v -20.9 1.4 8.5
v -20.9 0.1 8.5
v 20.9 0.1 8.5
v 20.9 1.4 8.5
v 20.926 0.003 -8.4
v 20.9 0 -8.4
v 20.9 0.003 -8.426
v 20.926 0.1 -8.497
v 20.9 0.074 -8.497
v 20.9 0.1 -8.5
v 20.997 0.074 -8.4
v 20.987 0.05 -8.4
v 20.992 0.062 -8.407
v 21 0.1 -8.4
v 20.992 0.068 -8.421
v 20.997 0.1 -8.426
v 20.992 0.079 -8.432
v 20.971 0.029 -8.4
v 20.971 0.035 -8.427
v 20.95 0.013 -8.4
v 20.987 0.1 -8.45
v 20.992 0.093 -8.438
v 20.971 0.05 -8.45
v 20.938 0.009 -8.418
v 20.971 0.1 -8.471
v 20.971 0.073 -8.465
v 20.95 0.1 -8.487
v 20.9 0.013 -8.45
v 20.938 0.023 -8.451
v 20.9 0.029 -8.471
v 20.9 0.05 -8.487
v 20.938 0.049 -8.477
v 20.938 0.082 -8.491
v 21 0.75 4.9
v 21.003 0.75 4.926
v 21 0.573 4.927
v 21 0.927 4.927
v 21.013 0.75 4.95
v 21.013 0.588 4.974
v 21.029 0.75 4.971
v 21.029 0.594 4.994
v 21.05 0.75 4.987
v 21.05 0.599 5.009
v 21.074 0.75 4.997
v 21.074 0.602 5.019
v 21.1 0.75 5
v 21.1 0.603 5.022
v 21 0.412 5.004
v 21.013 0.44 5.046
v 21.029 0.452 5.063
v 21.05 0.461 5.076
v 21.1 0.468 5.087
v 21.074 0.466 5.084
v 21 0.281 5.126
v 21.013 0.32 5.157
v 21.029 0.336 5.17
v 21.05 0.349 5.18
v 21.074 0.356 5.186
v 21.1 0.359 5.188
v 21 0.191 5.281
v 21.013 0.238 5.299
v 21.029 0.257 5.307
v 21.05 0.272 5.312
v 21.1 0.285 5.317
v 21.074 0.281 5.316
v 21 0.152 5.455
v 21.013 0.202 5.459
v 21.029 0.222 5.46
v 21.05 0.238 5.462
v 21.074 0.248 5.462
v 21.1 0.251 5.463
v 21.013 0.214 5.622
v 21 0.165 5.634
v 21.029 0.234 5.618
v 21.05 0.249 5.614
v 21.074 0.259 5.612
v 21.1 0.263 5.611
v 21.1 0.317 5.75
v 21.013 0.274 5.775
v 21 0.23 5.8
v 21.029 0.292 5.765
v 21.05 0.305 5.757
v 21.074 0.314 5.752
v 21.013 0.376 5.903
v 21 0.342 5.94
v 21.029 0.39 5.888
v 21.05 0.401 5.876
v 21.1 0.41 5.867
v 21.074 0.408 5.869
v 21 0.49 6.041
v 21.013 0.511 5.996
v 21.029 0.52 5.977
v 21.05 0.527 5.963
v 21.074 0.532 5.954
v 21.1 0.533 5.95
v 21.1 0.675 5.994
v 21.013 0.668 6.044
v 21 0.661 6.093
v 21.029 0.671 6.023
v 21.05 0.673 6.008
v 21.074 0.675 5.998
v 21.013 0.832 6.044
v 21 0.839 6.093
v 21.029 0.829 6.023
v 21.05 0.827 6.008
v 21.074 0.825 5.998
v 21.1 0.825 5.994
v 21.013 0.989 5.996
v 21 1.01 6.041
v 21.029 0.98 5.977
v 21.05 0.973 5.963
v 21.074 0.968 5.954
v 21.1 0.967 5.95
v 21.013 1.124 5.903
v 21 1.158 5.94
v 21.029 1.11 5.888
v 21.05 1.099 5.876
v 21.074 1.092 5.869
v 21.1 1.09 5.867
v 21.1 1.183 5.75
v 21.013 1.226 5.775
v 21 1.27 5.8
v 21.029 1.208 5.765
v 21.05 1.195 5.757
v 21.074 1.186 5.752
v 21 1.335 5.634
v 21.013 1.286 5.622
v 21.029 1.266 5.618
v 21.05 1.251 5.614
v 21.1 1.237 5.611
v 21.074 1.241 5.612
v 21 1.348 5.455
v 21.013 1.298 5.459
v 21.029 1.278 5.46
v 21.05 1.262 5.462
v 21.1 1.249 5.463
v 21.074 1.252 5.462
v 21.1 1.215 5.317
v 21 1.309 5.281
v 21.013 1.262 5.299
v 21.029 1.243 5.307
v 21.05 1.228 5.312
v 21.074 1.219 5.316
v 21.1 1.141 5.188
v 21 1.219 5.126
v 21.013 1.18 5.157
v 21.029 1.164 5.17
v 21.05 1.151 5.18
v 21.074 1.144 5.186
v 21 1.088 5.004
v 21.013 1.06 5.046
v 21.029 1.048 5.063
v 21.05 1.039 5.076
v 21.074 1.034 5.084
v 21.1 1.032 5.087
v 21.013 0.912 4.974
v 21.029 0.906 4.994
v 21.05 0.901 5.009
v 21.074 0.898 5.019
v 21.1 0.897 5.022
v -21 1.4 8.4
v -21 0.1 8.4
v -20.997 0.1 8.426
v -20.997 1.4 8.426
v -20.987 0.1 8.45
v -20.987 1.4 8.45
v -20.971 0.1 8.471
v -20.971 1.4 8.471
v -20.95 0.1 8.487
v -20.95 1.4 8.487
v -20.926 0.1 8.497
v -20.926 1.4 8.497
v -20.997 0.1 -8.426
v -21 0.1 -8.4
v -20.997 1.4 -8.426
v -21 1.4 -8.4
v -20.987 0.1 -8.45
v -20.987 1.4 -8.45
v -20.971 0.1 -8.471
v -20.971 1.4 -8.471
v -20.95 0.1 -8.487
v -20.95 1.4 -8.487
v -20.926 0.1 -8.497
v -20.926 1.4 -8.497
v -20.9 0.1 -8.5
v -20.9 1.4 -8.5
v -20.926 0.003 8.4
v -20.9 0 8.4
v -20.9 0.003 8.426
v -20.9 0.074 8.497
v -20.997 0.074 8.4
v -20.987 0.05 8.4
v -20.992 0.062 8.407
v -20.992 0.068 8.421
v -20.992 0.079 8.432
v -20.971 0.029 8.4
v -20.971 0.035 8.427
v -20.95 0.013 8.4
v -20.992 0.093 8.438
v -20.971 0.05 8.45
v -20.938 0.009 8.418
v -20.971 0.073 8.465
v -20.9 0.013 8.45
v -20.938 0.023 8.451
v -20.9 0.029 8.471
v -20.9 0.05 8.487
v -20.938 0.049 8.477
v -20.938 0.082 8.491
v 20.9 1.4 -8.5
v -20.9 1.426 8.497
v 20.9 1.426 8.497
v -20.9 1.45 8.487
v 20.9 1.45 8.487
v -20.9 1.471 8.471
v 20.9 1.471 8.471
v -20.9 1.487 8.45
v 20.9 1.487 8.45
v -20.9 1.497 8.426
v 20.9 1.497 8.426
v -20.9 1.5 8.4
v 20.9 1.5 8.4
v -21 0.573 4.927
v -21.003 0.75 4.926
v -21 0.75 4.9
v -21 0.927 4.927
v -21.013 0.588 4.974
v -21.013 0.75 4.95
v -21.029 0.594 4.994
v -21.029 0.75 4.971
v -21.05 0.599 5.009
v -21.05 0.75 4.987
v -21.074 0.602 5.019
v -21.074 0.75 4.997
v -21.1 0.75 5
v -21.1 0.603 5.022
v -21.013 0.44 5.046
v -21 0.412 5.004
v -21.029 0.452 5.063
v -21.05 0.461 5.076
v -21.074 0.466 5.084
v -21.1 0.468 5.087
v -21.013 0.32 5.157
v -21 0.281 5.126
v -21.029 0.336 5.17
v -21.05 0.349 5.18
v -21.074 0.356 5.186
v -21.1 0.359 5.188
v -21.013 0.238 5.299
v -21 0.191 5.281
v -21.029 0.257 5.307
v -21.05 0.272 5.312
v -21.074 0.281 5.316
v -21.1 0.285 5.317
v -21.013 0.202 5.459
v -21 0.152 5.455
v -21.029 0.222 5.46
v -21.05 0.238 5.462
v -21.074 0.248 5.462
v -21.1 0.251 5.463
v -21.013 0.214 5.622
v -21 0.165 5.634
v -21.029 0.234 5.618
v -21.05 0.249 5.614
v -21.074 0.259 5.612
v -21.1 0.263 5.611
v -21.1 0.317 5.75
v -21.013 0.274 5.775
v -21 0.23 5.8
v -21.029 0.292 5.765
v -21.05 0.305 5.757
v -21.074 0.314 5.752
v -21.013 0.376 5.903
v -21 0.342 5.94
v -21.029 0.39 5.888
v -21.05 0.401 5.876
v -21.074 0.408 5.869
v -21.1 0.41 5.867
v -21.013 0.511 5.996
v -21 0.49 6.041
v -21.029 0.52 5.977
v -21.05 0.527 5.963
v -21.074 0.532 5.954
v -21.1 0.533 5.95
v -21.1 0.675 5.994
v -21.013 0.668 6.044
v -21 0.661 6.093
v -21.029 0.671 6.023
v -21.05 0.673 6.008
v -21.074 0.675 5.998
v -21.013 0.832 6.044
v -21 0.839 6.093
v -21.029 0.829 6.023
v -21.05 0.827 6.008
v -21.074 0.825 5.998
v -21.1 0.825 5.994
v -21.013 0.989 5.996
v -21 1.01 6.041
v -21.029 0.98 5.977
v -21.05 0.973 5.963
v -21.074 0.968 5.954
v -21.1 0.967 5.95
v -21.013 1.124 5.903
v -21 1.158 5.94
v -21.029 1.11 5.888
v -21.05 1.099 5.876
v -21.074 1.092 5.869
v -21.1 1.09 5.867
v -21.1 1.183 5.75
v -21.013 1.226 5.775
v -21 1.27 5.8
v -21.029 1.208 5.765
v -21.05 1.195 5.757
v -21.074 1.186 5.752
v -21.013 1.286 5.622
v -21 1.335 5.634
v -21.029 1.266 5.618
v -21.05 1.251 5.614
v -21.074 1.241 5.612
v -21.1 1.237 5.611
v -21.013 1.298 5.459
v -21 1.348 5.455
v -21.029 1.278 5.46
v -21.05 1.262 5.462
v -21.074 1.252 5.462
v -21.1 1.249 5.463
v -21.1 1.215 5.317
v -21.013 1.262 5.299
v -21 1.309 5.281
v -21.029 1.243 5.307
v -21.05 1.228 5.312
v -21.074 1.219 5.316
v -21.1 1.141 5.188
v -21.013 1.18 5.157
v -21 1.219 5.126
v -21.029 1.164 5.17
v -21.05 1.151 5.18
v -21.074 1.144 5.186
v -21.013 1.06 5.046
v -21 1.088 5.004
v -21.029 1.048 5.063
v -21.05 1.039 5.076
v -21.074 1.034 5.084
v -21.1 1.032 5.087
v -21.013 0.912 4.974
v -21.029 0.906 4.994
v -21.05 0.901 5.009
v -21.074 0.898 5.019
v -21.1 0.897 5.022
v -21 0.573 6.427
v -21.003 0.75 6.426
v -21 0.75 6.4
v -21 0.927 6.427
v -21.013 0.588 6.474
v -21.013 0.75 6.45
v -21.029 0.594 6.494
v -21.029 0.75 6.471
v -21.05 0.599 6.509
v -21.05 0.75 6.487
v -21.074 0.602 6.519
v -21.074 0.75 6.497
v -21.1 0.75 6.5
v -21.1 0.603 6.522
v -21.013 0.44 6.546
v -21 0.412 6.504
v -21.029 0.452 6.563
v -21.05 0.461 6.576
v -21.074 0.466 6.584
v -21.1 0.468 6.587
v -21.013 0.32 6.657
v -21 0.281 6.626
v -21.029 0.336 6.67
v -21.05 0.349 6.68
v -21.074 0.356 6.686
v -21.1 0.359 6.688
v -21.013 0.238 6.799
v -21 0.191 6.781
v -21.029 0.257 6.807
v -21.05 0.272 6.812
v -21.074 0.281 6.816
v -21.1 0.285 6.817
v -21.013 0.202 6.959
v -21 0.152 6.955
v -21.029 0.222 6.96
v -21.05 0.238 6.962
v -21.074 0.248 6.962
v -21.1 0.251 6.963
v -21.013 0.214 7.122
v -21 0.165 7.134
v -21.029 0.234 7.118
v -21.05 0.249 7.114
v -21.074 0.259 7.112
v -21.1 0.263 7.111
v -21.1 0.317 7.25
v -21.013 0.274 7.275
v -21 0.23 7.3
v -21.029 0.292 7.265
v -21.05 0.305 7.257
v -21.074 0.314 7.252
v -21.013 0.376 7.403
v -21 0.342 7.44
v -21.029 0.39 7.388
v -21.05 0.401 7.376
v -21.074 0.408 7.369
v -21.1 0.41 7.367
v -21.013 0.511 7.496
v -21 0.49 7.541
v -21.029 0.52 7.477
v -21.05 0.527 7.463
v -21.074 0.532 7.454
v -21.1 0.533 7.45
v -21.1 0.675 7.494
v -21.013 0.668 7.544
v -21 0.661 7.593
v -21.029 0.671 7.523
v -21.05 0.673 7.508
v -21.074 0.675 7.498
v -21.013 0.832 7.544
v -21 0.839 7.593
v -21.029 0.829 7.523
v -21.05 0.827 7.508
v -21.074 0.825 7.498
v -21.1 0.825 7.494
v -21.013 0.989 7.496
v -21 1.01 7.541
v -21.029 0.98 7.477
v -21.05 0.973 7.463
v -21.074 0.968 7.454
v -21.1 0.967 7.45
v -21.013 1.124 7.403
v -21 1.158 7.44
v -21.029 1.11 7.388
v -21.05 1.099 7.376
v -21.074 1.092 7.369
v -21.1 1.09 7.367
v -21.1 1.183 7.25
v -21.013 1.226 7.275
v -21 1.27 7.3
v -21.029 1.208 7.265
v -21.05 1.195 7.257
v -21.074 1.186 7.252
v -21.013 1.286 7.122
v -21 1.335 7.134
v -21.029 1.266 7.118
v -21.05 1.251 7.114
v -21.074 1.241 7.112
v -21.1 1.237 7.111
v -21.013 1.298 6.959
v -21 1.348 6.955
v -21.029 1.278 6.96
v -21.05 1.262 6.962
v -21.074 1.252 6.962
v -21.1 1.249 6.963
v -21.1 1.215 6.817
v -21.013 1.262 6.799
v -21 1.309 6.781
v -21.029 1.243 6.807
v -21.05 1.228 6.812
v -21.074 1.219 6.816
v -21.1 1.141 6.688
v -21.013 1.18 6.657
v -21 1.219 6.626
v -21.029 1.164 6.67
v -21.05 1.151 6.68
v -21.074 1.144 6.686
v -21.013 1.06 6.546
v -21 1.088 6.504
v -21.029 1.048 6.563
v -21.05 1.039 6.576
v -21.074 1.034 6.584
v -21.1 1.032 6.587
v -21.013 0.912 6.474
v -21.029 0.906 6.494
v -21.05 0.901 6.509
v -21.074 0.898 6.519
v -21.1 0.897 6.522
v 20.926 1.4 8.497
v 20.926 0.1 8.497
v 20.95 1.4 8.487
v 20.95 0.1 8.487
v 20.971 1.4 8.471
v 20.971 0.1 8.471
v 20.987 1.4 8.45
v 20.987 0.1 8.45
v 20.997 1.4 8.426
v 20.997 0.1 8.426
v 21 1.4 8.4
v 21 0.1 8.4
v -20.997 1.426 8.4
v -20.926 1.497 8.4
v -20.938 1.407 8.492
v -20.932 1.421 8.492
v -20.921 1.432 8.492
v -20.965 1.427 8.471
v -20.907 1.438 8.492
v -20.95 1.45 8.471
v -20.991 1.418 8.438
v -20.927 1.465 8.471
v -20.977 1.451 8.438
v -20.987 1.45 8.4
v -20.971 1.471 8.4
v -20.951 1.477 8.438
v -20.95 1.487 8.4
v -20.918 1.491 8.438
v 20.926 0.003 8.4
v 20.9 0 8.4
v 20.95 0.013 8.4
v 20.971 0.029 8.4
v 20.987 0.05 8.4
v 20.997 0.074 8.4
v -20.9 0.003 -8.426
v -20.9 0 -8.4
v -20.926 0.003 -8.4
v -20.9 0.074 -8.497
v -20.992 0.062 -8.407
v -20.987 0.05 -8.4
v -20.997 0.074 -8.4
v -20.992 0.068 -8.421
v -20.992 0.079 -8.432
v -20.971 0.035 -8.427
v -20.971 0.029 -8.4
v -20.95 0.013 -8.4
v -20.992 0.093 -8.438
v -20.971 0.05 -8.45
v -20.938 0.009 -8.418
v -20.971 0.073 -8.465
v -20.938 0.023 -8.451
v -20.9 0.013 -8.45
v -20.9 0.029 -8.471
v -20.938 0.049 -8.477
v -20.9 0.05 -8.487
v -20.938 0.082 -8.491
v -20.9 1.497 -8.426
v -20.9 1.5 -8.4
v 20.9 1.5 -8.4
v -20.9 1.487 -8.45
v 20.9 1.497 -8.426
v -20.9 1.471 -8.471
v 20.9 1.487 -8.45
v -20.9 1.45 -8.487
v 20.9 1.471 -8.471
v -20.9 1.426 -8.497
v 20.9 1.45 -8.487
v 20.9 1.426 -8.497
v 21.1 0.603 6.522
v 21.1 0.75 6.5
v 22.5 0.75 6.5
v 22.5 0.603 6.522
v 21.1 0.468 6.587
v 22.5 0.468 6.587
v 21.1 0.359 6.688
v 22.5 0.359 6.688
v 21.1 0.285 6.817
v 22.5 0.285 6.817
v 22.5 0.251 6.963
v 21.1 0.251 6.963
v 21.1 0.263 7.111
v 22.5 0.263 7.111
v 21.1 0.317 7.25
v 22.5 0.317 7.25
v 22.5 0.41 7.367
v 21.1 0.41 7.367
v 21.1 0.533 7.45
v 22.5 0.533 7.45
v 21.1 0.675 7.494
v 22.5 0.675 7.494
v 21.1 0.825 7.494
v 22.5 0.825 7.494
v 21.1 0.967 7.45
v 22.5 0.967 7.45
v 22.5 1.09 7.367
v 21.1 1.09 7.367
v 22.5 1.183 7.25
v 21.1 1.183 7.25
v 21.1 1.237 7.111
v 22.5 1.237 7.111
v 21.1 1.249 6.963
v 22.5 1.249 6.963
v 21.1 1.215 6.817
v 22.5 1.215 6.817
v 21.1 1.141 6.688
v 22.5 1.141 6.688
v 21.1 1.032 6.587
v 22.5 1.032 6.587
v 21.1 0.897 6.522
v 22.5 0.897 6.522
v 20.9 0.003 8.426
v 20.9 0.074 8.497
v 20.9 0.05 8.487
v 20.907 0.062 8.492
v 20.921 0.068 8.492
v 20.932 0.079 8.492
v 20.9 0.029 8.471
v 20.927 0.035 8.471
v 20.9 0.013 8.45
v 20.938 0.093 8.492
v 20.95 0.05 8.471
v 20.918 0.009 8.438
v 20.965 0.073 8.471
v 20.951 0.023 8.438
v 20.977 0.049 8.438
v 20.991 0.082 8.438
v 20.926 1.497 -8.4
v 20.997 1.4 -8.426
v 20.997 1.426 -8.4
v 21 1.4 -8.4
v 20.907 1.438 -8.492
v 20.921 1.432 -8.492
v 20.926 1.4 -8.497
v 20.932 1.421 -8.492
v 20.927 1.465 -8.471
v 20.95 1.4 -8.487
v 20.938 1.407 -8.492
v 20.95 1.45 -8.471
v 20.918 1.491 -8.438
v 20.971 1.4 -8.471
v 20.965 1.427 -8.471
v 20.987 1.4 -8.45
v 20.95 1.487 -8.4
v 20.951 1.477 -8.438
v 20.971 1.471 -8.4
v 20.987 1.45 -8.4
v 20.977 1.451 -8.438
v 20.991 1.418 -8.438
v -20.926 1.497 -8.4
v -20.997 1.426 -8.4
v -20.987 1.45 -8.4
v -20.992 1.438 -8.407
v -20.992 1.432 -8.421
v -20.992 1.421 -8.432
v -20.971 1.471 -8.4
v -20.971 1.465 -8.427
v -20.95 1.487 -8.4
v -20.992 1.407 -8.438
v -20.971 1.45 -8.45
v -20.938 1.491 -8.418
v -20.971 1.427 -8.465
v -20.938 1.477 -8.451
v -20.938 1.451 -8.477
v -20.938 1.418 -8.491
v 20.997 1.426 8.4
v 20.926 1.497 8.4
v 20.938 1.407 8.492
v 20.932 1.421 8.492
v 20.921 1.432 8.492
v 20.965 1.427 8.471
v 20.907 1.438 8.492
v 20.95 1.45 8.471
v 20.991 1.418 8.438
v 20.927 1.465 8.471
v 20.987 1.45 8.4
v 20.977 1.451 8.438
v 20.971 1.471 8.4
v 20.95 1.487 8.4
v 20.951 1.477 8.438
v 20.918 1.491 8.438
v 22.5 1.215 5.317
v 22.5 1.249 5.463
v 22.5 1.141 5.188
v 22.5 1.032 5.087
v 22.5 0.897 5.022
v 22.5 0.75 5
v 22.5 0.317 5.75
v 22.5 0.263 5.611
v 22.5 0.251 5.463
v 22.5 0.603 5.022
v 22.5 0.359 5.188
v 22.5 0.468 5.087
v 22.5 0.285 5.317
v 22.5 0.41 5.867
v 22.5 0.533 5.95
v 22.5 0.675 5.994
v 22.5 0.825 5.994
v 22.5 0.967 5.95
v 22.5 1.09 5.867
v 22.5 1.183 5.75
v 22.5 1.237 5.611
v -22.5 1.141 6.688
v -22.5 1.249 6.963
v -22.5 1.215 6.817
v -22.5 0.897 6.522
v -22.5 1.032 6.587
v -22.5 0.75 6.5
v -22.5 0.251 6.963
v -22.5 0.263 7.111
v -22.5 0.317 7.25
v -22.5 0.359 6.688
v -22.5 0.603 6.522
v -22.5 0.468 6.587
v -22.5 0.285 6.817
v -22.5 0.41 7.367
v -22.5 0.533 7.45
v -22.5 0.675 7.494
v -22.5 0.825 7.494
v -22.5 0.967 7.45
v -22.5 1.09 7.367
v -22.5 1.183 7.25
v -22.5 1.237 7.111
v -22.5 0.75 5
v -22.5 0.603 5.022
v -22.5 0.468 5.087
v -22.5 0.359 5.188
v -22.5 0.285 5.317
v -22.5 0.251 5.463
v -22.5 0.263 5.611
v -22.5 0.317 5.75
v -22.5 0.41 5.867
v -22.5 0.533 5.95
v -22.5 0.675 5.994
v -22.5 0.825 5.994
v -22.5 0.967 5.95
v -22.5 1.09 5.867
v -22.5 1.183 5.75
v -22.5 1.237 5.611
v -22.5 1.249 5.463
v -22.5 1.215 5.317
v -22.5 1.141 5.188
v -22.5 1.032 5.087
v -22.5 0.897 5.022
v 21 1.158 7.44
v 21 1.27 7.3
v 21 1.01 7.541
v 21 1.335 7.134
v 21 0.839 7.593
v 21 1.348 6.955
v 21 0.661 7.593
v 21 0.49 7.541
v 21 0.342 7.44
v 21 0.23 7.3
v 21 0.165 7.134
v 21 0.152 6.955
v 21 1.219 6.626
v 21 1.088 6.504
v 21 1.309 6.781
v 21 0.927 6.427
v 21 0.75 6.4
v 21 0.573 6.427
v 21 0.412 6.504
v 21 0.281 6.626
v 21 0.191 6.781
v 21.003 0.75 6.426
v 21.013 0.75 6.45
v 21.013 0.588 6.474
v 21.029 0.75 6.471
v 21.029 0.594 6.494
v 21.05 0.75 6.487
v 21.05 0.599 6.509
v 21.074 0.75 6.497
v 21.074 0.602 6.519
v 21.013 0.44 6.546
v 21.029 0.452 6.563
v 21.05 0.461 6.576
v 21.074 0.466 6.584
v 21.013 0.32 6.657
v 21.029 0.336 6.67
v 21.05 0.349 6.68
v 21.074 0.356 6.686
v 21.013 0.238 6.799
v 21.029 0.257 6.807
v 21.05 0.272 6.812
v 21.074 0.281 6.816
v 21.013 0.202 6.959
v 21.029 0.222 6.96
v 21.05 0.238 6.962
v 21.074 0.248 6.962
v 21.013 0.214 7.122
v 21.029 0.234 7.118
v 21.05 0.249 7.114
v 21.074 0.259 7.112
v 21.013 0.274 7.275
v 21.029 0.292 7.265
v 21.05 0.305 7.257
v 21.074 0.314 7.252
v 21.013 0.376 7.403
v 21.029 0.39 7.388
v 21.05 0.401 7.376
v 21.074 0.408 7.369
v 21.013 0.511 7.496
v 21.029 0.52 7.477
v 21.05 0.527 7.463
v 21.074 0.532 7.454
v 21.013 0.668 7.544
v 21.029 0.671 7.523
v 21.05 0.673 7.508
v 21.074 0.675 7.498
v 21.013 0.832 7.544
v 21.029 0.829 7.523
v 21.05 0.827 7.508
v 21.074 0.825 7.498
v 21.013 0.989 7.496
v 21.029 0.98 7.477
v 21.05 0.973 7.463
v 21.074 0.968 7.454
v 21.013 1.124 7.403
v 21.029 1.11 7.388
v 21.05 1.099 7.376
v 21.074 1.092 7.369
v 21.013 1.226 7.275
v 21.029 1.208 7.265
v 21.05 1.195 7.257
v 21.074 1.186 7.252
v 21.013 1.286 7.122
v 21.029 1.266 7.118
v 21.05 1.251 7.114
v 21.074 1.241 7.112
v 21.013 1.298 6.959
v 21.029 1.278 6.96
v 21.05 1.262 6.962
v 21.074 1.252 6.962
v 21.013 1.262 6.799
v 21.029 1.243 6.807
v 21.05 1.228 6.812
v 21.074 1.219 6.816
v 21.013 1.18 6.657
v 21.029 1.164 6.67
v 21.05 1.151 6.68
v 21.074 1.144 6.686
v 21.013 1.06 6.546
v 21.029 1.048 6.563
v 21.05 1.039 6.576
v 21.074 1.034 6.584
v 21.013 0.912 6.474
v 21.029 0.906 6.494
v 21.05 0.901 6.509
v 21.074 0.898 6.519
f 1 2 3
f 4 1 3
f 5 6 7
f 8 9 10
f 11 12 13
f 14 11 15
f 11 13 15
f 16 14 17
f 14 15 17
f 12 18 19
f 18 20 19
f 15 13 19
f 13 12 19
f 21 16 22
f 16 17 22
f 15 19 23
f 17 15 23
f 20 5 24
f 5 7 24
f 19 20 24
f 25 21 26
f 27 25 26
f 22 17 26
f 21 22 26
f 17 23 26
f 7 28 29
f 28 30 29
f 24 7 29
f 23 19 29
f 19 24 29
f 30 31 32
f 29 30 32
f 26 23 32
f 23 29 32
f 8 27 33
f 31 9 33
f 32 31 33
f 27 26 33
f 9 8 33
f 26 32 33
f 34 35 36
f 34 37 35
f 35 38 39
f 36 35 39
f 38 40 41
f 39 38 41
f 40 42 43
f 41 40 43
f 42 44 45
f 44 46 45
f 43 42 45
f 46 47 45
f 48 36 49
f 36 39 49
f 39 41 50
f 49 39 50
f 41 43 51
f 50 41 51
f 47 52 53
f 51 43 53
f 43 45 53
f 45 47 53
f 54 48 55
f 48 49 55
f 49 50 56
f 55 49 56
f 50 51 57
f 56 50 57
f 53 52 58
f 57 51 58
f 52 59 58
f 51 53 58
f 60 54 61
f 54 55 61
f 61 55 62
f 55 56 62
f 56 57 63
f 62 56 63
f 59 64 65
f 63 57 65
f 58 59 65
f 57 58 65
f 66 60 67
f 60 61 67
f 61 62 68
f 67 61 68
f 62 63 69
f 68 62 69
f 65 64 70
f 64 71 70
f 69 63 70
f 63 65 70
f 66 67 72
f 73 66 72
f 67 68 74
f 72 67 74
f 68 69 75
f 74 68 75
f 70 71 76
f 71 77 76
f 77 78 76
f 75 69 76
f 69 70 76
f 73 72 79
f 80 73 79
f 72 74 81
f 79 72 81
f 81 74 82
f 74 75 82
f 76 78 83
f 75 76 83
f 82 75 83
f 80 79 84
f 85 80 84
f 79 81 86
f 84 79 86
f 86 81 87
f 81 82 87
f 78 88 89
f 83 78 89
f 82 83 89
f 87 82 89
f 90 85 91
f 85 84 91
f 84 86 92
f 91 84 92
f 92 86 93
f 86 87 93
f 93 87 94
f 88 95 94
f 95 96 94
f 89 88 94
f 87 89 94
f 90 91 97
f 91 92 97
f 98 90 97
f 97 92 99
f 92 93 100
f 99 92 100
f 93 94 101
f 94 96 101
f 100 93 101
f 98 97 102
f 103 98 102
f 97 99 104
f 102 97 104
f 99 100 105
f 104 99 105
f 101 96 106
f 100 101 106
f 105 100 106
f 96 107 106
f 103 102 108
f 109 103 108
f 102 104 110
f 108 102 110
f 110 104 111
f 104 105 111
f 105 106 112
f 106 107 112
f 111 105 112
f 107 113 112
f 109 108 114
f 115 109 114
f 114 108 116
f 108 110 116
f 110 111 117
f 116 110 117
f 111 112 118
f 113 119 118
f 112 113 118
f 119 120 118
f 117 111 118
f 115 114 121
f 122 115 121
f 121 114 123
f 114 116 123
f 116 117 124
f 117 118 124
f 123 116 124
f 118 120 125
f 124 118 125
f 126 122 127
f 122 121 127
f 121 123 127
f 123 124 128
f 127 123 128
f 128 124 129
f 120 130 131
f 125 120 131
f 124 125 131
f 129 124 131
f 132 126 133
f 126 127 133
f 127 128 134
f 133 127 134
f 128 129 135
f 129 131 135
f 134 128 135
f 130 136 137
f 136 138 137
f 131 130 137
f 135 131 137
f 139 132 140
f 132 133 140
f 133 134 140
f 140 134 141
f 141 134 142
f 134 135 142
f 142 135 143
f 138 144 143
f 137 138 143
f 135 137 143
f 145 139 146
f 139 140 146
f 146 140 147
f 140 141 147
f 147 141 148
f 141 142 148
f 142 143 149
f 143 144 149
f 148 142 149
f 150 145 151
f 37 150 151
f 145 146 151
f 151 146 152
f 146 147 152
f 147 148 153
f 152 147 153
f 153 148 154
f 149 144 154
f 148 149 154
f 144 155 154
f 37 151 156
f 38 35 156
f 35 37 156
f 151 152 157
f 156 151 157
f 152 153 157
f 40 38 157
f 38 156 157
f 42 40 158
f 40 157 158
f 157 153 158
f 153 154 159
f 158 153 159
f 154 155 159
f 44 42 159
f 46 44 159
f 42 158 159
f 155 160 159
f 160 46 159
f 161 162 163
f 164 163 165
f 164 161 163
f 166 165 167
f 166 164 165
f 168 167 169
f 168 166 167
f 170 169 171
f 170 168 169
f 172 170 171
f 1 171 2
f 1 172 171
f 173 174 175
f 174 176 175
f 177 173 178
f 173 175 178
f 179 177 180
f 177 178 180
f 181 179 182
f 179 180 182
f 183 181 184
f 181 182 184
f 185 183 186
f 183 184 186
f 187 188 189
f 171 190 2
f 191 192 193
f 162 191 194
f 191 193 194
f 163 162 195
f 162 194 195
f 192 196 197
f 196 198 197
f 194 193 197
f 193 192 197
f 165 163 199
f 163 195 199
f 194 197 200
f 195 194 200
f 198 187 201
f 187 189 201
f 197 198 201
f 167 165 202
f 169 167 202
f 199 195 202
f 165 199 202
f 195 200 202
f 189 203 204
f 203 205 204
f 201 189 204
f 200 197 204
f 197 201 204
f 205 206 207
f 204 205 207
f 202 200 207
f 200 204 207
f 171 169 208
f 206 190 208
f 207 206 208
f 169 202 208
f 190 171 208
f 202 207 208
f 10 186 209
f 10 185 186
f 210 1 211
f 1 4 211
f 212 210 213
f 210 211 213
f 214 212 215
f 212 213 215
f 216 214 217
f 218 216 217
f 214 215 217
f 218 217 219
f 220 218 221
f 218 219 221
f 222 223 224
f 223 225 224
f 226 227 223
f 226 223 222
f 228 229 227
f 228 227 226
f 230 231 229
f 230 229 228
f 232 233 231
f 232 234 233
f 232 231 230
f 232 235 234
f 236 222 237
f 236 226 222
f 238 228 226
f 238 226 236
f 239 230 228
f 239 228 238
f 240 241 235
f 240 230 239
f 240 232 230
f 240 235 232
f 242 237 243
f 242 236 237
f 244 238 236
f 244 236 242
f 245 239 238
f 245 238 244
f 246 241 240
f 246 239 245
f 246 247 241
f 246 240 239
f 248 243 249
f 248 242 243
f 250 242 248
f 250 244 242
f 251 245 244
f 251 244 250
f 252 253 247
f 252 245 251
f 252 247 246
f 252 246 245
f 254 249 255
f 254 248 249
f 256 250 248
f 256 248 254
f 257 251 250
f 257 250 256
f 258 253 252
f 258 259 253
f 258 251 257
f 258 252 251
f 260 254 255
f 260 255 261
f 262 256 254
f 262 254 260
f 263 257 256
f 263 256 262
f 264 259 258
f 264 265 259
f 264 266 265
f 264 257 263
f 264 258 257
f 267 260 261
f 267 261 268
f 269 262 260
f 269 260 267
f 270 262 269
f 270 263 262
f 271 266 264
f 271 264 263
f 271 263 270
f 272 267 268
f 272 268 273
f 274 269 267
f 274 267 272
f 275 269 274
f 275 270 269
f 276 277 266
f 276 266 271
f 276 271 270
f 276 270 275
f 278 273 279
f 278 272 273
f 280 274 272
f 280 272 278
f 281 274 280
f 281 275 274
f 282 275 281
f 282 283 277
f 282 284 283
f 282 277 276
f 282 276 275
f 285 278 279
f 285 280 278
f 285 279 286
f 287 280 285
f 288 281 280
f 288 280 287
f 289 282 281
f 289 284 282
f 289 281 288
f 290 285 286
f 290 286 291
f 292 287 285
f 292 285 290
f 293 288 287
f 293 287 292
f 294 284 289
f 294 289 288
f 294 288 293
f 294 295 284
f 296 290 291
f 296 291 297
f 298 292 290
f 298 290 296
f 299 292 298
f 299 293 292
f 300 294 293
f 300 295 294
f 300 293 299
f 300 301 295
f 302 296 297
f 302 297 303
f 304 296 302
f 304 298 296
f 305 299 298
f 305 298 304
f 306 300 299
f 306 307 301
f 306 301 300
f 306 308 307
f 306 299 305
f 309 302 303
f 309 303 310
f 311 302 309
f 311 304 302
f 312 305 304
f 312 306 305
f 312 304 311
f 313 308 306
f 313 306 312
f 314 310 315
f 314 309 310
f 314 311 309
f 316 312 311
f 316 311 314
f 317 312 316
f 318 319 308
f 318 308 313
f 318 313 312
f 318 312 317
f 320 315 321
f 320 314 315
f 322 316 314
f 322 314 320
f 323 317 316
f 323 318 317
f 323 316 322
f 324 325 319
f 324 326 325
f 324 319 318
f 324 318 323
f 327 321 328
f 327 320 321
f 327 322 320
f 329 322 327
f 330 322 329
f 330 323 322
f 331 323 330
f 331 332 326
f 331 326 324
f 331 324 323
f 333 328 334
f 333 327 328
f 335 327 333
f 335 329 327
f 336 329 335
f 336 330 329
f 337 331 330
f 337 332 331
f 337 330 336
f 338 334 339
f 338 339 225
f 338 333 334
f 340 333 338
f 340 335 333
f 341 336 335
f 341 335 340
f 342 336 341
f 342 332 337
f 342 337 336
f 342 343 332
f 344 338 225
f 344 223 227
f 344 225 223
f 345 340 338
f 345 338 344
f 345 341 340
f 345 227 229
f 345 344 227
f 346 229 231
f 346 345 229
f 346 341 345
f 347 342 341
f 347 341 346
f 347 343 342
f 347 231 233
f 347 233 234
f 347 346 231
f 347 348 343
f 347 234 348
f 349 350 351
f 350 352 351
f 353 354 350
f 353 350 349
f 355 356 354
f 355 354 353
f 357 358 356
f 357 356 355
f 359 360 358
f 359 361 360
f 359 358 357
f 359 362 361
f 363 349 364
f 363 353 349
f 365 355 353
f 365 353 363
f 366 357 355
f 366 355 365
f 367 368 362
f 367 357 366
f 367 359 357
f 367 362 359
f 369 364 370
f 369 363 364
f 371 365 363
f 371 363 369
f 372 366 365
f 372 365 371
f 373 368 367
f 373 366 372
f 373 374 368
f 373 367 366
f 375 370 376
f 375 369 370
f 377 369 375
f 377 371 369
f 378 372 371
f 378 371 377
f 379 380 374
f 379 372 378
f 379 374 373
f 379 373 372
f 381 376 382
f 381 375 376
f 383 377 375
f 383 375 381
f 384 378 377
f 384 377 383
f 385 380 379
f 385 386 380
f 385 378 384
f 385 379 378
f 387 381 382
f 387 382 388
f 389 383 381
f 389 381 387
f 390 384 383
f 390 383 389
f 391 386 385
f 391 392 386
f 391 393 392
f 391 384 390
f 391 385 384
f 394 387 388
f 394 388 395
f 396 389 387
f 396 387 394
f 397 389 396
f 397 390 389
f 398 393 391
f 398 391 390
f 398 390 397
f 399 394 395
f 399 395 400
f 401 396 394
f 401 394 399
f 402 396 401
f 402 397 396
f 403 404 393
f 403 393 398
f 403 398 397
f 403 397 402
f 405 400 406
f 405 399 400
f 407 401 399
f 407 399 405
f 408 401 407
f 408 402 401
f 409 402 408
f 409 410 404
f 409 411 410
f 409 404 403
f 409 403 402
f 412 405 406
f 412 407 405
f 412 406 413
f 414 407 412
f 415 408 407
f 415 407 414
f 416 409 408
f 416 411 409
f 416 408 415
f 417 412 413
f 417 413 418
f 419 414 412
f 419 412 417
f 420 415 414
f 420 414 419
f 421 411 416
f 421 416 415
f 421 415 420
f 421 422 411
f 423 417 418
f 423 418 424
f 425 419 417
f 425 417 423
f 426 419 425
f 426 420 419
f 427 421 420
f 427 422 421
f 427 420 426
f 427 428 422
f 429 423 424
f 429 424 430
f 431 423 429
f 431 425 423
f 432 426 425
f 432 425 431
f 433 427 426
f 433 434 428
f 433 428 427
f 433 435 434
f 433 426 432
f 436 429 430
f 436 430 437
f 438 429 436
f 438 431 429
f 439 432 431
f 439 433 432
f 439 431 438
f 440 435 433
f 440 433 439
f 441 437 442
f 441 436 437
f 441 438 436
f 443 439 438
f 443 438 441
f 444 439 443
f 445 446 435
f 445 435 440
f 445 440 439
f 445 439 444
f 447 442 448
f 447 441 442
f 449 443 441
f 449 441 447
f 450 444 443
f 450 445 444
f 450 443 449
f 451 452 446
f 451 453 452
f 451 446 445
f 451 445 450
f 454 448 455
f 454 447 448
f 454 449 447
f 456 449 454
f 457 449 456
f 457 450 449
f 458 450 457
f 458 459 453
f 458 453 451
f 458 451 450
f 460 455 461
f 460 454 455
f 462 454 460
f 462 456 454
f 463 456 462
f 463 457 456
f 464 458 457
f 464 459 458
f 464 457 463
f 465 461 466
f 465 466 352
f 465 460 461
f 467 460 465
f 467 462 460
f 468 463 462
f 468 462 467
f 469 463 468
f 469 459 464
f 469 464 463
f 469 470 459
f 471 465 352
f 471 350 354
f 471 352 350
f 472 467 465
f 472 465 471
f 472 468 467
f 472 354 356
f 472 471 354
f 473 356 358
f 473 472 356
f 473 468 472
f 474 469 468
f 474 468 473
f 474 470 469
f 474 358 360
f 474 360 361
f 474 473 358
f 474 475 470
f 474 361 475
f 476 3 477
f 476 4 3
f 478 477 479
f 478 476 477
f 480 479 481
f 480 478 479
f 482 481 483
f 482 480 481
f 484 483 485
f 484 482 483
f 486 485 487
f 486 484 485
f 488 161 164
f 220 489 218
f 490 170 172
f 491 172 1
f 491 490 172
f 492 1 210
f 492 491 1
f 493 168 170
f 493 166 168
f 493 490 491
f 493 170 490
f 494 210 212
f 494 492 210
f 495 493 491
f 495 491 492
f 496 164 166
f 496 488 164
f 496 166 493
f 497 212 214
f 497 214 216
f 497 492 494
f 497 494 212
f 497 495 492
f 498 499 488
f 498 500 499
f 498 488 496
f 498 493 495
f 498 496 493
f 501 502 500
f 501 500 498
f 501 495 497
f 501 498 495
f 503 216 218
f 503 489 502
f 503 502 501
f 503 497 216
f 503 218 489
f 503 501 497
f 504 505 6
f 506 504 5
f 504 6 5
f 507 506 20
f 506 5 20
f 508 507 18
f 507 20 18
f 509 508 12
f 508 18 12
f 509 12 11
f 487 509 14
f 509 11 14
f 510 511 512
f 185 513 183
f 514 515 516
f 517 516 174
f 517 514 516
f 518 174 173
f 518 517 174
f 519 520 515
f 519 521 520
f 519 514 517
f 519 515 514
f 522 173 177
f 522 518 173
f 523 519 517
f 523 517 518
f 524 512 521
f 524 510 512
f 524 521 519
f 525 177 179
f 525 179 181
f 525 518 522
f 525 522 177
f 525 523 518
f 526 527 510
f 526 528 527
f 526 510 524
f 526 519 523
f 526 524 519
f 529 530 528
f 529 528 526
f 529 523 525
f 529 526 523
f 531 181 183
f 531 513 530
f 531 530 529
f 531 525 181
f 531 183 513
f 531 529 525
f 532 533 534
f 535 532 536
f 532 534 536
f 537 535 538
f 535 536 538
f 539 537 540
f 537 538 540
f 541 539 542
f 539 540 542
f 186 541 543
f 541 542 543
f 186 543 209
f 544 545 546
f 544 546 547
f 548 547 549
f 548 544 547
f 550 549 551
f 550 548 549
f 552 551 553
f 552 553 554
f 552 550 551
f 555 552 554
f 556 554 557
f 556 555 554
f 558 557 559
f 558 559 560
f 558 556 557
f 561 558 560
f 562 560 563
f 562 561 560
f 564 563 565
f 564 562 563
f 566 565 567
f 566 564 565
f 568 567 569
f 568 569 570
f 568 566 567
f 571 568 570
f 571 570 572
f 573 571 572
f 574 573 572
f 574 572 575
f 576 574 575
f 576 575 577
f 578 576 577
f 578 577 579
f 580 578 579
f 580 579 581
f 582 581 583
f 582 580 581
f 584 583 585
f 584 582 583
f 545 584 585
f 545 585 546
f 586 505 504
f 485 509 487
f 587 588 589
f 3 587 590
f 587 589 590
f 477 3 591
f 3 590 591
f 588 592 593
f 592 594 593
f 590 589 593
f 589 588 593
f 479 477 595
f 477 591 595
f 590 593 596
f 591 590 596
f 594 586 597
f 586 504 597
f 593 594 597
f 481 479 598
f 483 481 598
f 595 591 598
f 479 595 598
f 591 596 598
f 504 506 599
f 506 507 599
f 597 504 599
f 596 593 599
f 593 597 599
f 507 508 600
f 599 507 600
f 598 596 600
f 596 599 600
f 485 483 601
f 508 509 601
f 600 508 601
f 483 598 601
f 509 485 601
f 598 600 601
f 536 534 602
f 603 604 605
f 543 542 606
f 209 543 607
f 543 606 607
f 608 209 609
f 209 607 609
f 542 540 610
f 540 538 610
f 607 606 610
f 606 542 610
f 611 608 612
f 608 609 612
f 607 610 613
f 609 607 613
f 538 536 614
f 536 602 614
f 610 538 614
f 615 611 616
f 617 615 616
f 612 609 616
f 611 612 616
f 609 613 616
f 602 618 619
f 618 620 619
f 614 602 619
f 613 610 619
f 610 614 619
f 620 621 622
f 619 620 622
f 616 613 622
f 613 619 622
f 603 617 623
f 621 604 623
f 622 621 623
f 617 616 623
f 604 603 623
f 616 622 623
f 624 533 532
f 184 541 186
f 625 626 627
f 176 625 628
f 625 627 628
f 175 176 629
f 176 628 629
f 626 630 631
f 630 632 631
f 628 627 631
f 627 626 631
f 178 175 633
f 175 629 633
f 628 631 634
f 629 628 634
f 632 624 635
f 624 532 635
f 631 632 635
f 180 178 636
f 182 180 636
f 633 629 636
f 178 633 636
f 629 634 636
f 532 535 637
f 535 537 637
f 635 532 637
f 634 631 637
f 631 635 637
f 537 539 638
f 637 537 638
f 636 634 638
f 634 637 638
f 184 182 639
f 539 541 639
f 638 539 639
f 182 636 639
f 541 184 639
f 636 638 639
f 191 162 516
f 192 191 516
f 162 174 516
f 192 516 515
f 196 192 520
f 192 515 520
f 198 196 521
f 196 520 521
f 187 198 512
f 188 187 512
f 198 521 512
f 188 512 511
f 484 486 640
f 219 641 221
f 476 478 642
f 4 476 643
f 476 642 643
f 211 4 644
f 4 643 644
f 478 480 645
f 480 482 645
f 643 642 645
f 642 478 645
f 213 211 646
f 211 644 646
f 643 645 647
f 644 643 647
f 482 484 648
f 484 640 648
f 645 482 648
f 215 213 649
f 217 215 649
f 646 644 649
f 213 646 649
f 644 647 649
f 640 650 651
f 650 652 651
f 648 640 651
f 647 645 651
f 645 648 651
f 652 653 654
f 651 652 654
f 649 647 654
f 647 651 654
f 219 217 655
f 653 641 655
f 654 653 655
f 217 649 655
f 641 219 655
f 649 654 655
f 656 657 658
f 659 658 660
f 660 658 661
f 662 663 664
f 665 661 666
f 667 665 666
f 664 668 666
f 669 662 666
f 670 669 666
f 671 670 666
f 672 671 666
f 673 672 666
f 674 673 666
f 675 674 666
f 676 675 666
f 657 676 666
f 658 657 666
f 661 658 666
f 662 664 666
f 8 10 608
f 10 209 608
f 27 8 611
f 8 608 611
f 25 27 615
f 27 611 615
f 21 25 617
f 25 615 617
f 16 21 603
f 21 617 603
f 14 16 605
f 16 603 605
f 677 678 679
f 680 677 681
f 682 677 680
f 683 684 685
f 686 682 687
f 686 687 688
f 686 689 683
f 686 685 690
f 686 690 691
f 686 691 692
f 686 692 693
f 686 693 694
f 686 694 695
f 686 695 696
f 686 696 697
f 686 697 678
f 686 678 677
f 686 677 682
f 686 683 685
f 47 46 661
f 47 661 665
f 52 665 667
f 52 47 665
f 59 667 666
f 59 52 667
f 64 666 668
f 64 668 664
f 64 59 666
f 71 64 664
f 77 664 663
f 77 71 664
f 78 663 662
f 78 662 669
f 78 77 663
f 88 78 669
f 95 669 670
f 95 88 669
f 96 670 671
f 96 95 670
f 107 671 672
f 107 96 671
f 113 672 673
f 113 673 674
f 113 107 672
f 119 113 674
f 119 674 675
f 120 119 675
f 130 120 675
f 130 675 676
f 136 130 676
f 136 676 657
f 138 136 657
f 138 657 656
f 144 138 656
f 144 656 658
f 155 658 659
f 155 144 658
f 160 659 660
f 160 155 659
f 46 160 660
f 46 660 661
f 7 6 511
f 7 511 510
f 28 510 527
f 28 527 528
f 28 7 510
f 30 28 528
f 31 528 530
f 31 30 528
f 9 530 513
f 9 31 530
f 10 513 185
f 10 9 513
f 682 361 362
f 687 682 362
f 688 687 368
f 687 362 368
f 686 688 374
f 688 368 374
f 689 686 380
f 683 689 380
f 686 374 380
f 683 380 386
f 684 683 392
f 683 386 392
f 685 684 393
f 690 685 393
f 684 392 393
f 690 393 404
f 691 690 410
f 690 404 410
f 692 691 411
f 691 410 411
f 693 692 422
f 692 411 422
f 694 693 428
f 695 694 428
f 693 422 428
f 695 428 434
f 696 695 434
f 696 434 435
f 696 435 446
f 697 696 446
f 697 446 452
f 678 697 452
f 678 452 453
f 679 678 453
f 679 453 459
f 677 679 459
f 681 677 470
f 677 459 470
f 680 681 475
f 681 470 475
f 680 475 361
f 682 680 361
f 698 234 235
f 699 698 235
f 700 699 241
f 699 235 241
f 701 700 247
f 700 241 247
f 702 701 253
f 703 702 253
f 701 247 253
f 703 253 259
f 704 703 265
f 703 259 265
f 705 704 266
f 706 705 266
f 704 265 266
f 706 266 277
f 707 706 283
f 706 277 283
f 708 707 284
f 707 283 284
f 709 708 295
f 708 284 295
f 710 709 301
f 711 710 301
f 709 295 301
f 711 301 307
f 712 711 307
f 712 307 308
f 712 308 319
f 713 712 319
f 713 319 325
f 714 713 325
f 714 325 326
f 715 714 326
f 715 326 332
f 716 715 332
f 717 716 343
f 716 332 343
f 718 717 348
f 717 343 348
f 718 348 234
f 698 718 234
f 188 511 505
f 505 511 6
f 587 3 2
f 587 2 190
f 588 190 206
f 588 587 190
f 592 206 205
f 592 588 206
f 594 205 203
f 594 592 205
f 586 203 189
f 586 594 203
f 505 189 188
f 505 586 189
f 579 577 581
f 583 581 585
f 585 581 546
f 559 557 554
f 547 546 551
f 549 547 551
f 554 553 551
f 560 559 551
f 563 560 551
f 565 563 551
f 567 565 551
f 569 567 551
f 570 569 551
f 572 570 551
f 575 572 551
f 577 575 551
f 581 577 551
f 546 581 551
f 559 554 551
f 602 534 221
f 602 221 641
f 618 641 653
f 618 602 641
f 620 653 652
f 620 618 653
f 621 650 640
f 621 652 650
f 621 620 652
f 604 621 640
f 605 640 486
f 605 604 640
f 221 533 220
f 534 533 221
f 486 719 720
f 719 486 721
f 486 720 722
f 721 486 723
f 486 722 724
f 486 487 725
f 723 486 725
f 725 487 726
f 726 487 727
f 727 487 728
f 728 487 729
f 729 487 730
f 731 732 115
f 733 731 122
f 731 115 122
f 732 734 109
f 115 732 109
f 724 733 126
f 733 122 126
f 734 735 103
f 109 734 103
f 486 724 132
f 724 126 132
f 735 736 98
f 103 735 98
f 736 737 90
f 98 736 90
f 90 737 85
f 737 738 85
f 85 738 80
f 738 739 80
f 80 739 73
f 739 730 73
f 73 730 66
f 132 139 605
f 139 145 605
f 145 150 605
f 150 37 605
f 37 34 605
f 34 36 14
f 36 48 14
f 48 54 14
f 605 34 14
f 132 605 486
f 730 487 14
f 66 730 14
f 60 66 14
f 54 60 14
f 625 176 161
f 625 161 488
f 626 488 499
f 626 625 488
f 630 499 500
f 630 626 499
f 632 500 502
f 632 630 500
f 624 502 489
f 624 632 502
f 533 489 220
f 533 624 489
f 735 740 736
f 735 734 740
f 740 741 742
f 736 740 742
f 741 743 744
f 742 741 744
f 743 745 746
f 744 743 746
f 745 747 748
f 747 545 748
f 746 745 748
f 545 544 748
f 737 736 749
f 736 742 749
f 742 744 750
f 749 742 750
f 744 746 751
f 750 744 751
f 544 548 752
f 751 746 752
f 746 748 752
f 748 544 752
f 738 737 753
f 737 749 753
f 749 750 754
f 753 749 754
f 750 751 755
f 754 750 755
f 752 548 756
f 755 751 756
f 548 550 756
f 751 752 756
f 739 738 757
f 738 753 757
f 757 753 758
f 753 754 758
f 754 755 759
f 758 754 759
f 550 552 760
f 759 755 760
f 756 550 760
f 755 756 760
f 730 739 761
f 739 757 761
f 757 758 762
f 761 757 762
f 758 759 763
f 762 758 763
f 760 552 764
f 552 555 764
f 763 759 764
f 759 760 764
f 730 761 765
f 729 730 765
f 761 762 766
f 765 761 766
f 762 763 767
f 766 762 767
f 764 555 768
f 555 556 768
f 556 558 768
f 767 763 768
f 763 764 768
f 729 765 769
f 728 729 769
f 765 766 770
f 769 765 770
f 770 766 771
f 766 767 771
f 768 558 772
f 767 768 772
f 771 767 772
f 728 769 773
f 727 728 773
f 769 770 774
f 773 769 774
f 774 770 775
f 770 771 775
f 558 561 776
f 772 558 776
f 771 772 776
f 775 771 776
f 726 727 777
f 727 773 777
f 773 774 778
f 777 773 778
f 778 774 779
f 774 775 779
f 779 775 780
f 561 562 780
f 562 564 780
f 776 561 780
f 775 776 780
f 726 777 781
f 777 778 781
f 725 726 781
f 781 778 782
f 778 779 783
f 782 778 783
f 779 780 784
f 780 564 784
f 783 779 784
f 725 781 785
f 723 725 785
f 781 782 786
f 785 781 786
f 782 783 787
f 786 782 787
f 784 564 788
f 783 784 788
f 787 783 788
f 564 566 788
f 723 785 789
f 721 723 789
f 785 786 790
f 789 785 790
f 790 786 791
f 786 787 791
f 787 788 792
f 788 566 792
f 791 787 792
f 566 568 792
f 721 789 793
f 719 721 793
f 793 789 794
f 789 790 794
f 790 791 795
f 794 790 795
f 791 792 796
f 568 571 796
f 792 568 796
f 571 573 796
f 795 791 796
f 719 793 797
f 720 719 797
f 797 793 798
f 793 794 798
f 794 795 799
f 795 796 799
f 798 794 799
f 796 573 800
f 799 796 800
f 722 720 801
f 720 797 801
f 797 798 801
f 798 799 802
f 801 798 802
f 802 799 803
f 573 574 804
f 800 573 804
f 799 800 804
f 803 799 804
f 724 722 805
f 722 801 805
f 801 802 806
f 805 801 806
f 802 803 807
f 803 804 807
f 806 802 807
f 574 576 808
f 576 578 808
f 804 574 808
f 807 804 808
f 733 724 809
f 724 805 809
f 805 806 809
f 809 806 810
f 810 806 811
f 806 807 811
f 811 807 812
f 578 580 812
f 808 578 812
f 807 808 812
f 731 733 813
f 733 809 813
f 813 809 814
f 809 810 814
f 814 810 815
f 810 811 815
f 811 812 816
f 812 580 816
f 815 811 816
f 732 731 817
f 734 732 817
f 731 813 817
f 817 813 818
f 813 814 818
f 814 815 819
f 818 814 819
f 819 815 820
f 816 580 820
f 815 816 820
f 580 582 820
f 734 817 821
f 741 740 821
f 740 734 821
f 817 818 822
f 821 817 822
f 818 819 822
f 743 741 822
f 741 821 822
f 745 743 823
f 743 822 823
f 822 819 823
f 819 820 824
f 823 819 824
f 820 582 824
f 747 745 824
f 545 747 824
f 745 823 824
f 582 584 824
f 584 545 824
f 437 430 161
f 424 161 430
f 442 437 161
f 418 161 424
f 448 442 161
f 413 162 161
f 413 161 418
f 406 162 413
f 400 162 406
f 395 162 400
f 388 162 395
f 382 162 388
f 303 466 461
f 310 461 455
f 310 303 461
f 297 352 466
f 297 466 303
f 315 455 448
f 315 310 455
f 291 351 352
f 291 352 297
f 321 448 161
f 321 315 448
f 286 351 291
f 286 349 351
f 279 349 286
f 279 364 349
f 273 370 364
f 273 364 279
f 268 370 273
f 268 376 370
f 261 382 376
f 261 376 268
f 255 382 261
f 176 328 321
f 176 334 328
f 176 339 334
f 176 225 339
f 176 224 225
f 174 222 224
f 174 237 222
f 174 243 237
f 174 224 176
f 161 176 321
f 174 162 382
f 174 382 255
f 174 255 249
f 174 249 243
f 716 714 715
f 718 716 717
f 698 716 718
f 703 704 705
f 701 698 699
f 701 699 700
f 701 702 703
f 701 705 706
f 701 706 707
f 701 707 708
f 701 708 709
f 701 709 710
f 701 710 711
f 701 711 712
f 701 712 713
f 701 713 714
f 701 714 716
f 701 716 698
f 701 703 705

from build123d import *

# Parameters (mm, degrees)
SKETCH1_W           = 42
SKETCH1_H           = 17
BOSS_EXTRUDE1_DEPTH = 1.5
SKETCH2_R           = 0.5
BOSS_EXTRUDE2_DEPTH = 1.5
FILLET1_R           = 0.1


with BuildPart() as part:
    # Sketch1 → Boss-Extrude1 (new body)
    with BuildSketch(Plane(origin=(0, 0, 0), x_dir=(1, 0, 0), z_dir=(0, 1, 0))):
        Rectangle(SKETCH1_W, SKETCH1_H)
    extrude(amount=BOSS_EXTRUDE1_DEPTH)

    # Sketch2 → Boss-Extrude2 (add)
    with BuildSketch(Plane.ZY.offset(21)):
        with Locations(Location((5.5, 0.75, 0), (0, 0, 180))):
            Circle(SKETCH2_R)
        with Locations(Location((7, 0.75, 0), (0, 0, 180))):
            Circle(SKETCH2_R)
    boss_extrude2 = extrude(amount=BOSS_EXTRUDE2_DEPTH)

    # Mirror1: Boss-Extrude2 across plane
    add(boss_extrude2.mirror(Plane(origin=(0, 0, 0), x_dir=(0, 0, 1), z_dir=(1, 0, 0))))

    # Fillet1
    fillet1_edges = [part.edges().sort_by_distance(p)[0] for p in [
        (21, 1.5, 0),
        (-21, 0.75, 7.5),
        (-21, 0.75, 6),
        (0, 1.5, -8.5),
        (21, 0.75, 6),
        (21, 0.75, 7.5),
        (-21, 1.5, 0),
        (0, 0, -8.5),
        (21, 0, 0),
        (0, 0, 8.5),
        (-21, 0, 0),
        (-21, 0.75, -8.5),
        (21, 0.75, -8.5),
        (21, 0.75, 8.5),
        (-21, 0.75, 8.5),
        (0, 1.5, 8.5),
    ]]
    fillet(fillet1_edges, radius=FILLET1_R)


solid = part.part
